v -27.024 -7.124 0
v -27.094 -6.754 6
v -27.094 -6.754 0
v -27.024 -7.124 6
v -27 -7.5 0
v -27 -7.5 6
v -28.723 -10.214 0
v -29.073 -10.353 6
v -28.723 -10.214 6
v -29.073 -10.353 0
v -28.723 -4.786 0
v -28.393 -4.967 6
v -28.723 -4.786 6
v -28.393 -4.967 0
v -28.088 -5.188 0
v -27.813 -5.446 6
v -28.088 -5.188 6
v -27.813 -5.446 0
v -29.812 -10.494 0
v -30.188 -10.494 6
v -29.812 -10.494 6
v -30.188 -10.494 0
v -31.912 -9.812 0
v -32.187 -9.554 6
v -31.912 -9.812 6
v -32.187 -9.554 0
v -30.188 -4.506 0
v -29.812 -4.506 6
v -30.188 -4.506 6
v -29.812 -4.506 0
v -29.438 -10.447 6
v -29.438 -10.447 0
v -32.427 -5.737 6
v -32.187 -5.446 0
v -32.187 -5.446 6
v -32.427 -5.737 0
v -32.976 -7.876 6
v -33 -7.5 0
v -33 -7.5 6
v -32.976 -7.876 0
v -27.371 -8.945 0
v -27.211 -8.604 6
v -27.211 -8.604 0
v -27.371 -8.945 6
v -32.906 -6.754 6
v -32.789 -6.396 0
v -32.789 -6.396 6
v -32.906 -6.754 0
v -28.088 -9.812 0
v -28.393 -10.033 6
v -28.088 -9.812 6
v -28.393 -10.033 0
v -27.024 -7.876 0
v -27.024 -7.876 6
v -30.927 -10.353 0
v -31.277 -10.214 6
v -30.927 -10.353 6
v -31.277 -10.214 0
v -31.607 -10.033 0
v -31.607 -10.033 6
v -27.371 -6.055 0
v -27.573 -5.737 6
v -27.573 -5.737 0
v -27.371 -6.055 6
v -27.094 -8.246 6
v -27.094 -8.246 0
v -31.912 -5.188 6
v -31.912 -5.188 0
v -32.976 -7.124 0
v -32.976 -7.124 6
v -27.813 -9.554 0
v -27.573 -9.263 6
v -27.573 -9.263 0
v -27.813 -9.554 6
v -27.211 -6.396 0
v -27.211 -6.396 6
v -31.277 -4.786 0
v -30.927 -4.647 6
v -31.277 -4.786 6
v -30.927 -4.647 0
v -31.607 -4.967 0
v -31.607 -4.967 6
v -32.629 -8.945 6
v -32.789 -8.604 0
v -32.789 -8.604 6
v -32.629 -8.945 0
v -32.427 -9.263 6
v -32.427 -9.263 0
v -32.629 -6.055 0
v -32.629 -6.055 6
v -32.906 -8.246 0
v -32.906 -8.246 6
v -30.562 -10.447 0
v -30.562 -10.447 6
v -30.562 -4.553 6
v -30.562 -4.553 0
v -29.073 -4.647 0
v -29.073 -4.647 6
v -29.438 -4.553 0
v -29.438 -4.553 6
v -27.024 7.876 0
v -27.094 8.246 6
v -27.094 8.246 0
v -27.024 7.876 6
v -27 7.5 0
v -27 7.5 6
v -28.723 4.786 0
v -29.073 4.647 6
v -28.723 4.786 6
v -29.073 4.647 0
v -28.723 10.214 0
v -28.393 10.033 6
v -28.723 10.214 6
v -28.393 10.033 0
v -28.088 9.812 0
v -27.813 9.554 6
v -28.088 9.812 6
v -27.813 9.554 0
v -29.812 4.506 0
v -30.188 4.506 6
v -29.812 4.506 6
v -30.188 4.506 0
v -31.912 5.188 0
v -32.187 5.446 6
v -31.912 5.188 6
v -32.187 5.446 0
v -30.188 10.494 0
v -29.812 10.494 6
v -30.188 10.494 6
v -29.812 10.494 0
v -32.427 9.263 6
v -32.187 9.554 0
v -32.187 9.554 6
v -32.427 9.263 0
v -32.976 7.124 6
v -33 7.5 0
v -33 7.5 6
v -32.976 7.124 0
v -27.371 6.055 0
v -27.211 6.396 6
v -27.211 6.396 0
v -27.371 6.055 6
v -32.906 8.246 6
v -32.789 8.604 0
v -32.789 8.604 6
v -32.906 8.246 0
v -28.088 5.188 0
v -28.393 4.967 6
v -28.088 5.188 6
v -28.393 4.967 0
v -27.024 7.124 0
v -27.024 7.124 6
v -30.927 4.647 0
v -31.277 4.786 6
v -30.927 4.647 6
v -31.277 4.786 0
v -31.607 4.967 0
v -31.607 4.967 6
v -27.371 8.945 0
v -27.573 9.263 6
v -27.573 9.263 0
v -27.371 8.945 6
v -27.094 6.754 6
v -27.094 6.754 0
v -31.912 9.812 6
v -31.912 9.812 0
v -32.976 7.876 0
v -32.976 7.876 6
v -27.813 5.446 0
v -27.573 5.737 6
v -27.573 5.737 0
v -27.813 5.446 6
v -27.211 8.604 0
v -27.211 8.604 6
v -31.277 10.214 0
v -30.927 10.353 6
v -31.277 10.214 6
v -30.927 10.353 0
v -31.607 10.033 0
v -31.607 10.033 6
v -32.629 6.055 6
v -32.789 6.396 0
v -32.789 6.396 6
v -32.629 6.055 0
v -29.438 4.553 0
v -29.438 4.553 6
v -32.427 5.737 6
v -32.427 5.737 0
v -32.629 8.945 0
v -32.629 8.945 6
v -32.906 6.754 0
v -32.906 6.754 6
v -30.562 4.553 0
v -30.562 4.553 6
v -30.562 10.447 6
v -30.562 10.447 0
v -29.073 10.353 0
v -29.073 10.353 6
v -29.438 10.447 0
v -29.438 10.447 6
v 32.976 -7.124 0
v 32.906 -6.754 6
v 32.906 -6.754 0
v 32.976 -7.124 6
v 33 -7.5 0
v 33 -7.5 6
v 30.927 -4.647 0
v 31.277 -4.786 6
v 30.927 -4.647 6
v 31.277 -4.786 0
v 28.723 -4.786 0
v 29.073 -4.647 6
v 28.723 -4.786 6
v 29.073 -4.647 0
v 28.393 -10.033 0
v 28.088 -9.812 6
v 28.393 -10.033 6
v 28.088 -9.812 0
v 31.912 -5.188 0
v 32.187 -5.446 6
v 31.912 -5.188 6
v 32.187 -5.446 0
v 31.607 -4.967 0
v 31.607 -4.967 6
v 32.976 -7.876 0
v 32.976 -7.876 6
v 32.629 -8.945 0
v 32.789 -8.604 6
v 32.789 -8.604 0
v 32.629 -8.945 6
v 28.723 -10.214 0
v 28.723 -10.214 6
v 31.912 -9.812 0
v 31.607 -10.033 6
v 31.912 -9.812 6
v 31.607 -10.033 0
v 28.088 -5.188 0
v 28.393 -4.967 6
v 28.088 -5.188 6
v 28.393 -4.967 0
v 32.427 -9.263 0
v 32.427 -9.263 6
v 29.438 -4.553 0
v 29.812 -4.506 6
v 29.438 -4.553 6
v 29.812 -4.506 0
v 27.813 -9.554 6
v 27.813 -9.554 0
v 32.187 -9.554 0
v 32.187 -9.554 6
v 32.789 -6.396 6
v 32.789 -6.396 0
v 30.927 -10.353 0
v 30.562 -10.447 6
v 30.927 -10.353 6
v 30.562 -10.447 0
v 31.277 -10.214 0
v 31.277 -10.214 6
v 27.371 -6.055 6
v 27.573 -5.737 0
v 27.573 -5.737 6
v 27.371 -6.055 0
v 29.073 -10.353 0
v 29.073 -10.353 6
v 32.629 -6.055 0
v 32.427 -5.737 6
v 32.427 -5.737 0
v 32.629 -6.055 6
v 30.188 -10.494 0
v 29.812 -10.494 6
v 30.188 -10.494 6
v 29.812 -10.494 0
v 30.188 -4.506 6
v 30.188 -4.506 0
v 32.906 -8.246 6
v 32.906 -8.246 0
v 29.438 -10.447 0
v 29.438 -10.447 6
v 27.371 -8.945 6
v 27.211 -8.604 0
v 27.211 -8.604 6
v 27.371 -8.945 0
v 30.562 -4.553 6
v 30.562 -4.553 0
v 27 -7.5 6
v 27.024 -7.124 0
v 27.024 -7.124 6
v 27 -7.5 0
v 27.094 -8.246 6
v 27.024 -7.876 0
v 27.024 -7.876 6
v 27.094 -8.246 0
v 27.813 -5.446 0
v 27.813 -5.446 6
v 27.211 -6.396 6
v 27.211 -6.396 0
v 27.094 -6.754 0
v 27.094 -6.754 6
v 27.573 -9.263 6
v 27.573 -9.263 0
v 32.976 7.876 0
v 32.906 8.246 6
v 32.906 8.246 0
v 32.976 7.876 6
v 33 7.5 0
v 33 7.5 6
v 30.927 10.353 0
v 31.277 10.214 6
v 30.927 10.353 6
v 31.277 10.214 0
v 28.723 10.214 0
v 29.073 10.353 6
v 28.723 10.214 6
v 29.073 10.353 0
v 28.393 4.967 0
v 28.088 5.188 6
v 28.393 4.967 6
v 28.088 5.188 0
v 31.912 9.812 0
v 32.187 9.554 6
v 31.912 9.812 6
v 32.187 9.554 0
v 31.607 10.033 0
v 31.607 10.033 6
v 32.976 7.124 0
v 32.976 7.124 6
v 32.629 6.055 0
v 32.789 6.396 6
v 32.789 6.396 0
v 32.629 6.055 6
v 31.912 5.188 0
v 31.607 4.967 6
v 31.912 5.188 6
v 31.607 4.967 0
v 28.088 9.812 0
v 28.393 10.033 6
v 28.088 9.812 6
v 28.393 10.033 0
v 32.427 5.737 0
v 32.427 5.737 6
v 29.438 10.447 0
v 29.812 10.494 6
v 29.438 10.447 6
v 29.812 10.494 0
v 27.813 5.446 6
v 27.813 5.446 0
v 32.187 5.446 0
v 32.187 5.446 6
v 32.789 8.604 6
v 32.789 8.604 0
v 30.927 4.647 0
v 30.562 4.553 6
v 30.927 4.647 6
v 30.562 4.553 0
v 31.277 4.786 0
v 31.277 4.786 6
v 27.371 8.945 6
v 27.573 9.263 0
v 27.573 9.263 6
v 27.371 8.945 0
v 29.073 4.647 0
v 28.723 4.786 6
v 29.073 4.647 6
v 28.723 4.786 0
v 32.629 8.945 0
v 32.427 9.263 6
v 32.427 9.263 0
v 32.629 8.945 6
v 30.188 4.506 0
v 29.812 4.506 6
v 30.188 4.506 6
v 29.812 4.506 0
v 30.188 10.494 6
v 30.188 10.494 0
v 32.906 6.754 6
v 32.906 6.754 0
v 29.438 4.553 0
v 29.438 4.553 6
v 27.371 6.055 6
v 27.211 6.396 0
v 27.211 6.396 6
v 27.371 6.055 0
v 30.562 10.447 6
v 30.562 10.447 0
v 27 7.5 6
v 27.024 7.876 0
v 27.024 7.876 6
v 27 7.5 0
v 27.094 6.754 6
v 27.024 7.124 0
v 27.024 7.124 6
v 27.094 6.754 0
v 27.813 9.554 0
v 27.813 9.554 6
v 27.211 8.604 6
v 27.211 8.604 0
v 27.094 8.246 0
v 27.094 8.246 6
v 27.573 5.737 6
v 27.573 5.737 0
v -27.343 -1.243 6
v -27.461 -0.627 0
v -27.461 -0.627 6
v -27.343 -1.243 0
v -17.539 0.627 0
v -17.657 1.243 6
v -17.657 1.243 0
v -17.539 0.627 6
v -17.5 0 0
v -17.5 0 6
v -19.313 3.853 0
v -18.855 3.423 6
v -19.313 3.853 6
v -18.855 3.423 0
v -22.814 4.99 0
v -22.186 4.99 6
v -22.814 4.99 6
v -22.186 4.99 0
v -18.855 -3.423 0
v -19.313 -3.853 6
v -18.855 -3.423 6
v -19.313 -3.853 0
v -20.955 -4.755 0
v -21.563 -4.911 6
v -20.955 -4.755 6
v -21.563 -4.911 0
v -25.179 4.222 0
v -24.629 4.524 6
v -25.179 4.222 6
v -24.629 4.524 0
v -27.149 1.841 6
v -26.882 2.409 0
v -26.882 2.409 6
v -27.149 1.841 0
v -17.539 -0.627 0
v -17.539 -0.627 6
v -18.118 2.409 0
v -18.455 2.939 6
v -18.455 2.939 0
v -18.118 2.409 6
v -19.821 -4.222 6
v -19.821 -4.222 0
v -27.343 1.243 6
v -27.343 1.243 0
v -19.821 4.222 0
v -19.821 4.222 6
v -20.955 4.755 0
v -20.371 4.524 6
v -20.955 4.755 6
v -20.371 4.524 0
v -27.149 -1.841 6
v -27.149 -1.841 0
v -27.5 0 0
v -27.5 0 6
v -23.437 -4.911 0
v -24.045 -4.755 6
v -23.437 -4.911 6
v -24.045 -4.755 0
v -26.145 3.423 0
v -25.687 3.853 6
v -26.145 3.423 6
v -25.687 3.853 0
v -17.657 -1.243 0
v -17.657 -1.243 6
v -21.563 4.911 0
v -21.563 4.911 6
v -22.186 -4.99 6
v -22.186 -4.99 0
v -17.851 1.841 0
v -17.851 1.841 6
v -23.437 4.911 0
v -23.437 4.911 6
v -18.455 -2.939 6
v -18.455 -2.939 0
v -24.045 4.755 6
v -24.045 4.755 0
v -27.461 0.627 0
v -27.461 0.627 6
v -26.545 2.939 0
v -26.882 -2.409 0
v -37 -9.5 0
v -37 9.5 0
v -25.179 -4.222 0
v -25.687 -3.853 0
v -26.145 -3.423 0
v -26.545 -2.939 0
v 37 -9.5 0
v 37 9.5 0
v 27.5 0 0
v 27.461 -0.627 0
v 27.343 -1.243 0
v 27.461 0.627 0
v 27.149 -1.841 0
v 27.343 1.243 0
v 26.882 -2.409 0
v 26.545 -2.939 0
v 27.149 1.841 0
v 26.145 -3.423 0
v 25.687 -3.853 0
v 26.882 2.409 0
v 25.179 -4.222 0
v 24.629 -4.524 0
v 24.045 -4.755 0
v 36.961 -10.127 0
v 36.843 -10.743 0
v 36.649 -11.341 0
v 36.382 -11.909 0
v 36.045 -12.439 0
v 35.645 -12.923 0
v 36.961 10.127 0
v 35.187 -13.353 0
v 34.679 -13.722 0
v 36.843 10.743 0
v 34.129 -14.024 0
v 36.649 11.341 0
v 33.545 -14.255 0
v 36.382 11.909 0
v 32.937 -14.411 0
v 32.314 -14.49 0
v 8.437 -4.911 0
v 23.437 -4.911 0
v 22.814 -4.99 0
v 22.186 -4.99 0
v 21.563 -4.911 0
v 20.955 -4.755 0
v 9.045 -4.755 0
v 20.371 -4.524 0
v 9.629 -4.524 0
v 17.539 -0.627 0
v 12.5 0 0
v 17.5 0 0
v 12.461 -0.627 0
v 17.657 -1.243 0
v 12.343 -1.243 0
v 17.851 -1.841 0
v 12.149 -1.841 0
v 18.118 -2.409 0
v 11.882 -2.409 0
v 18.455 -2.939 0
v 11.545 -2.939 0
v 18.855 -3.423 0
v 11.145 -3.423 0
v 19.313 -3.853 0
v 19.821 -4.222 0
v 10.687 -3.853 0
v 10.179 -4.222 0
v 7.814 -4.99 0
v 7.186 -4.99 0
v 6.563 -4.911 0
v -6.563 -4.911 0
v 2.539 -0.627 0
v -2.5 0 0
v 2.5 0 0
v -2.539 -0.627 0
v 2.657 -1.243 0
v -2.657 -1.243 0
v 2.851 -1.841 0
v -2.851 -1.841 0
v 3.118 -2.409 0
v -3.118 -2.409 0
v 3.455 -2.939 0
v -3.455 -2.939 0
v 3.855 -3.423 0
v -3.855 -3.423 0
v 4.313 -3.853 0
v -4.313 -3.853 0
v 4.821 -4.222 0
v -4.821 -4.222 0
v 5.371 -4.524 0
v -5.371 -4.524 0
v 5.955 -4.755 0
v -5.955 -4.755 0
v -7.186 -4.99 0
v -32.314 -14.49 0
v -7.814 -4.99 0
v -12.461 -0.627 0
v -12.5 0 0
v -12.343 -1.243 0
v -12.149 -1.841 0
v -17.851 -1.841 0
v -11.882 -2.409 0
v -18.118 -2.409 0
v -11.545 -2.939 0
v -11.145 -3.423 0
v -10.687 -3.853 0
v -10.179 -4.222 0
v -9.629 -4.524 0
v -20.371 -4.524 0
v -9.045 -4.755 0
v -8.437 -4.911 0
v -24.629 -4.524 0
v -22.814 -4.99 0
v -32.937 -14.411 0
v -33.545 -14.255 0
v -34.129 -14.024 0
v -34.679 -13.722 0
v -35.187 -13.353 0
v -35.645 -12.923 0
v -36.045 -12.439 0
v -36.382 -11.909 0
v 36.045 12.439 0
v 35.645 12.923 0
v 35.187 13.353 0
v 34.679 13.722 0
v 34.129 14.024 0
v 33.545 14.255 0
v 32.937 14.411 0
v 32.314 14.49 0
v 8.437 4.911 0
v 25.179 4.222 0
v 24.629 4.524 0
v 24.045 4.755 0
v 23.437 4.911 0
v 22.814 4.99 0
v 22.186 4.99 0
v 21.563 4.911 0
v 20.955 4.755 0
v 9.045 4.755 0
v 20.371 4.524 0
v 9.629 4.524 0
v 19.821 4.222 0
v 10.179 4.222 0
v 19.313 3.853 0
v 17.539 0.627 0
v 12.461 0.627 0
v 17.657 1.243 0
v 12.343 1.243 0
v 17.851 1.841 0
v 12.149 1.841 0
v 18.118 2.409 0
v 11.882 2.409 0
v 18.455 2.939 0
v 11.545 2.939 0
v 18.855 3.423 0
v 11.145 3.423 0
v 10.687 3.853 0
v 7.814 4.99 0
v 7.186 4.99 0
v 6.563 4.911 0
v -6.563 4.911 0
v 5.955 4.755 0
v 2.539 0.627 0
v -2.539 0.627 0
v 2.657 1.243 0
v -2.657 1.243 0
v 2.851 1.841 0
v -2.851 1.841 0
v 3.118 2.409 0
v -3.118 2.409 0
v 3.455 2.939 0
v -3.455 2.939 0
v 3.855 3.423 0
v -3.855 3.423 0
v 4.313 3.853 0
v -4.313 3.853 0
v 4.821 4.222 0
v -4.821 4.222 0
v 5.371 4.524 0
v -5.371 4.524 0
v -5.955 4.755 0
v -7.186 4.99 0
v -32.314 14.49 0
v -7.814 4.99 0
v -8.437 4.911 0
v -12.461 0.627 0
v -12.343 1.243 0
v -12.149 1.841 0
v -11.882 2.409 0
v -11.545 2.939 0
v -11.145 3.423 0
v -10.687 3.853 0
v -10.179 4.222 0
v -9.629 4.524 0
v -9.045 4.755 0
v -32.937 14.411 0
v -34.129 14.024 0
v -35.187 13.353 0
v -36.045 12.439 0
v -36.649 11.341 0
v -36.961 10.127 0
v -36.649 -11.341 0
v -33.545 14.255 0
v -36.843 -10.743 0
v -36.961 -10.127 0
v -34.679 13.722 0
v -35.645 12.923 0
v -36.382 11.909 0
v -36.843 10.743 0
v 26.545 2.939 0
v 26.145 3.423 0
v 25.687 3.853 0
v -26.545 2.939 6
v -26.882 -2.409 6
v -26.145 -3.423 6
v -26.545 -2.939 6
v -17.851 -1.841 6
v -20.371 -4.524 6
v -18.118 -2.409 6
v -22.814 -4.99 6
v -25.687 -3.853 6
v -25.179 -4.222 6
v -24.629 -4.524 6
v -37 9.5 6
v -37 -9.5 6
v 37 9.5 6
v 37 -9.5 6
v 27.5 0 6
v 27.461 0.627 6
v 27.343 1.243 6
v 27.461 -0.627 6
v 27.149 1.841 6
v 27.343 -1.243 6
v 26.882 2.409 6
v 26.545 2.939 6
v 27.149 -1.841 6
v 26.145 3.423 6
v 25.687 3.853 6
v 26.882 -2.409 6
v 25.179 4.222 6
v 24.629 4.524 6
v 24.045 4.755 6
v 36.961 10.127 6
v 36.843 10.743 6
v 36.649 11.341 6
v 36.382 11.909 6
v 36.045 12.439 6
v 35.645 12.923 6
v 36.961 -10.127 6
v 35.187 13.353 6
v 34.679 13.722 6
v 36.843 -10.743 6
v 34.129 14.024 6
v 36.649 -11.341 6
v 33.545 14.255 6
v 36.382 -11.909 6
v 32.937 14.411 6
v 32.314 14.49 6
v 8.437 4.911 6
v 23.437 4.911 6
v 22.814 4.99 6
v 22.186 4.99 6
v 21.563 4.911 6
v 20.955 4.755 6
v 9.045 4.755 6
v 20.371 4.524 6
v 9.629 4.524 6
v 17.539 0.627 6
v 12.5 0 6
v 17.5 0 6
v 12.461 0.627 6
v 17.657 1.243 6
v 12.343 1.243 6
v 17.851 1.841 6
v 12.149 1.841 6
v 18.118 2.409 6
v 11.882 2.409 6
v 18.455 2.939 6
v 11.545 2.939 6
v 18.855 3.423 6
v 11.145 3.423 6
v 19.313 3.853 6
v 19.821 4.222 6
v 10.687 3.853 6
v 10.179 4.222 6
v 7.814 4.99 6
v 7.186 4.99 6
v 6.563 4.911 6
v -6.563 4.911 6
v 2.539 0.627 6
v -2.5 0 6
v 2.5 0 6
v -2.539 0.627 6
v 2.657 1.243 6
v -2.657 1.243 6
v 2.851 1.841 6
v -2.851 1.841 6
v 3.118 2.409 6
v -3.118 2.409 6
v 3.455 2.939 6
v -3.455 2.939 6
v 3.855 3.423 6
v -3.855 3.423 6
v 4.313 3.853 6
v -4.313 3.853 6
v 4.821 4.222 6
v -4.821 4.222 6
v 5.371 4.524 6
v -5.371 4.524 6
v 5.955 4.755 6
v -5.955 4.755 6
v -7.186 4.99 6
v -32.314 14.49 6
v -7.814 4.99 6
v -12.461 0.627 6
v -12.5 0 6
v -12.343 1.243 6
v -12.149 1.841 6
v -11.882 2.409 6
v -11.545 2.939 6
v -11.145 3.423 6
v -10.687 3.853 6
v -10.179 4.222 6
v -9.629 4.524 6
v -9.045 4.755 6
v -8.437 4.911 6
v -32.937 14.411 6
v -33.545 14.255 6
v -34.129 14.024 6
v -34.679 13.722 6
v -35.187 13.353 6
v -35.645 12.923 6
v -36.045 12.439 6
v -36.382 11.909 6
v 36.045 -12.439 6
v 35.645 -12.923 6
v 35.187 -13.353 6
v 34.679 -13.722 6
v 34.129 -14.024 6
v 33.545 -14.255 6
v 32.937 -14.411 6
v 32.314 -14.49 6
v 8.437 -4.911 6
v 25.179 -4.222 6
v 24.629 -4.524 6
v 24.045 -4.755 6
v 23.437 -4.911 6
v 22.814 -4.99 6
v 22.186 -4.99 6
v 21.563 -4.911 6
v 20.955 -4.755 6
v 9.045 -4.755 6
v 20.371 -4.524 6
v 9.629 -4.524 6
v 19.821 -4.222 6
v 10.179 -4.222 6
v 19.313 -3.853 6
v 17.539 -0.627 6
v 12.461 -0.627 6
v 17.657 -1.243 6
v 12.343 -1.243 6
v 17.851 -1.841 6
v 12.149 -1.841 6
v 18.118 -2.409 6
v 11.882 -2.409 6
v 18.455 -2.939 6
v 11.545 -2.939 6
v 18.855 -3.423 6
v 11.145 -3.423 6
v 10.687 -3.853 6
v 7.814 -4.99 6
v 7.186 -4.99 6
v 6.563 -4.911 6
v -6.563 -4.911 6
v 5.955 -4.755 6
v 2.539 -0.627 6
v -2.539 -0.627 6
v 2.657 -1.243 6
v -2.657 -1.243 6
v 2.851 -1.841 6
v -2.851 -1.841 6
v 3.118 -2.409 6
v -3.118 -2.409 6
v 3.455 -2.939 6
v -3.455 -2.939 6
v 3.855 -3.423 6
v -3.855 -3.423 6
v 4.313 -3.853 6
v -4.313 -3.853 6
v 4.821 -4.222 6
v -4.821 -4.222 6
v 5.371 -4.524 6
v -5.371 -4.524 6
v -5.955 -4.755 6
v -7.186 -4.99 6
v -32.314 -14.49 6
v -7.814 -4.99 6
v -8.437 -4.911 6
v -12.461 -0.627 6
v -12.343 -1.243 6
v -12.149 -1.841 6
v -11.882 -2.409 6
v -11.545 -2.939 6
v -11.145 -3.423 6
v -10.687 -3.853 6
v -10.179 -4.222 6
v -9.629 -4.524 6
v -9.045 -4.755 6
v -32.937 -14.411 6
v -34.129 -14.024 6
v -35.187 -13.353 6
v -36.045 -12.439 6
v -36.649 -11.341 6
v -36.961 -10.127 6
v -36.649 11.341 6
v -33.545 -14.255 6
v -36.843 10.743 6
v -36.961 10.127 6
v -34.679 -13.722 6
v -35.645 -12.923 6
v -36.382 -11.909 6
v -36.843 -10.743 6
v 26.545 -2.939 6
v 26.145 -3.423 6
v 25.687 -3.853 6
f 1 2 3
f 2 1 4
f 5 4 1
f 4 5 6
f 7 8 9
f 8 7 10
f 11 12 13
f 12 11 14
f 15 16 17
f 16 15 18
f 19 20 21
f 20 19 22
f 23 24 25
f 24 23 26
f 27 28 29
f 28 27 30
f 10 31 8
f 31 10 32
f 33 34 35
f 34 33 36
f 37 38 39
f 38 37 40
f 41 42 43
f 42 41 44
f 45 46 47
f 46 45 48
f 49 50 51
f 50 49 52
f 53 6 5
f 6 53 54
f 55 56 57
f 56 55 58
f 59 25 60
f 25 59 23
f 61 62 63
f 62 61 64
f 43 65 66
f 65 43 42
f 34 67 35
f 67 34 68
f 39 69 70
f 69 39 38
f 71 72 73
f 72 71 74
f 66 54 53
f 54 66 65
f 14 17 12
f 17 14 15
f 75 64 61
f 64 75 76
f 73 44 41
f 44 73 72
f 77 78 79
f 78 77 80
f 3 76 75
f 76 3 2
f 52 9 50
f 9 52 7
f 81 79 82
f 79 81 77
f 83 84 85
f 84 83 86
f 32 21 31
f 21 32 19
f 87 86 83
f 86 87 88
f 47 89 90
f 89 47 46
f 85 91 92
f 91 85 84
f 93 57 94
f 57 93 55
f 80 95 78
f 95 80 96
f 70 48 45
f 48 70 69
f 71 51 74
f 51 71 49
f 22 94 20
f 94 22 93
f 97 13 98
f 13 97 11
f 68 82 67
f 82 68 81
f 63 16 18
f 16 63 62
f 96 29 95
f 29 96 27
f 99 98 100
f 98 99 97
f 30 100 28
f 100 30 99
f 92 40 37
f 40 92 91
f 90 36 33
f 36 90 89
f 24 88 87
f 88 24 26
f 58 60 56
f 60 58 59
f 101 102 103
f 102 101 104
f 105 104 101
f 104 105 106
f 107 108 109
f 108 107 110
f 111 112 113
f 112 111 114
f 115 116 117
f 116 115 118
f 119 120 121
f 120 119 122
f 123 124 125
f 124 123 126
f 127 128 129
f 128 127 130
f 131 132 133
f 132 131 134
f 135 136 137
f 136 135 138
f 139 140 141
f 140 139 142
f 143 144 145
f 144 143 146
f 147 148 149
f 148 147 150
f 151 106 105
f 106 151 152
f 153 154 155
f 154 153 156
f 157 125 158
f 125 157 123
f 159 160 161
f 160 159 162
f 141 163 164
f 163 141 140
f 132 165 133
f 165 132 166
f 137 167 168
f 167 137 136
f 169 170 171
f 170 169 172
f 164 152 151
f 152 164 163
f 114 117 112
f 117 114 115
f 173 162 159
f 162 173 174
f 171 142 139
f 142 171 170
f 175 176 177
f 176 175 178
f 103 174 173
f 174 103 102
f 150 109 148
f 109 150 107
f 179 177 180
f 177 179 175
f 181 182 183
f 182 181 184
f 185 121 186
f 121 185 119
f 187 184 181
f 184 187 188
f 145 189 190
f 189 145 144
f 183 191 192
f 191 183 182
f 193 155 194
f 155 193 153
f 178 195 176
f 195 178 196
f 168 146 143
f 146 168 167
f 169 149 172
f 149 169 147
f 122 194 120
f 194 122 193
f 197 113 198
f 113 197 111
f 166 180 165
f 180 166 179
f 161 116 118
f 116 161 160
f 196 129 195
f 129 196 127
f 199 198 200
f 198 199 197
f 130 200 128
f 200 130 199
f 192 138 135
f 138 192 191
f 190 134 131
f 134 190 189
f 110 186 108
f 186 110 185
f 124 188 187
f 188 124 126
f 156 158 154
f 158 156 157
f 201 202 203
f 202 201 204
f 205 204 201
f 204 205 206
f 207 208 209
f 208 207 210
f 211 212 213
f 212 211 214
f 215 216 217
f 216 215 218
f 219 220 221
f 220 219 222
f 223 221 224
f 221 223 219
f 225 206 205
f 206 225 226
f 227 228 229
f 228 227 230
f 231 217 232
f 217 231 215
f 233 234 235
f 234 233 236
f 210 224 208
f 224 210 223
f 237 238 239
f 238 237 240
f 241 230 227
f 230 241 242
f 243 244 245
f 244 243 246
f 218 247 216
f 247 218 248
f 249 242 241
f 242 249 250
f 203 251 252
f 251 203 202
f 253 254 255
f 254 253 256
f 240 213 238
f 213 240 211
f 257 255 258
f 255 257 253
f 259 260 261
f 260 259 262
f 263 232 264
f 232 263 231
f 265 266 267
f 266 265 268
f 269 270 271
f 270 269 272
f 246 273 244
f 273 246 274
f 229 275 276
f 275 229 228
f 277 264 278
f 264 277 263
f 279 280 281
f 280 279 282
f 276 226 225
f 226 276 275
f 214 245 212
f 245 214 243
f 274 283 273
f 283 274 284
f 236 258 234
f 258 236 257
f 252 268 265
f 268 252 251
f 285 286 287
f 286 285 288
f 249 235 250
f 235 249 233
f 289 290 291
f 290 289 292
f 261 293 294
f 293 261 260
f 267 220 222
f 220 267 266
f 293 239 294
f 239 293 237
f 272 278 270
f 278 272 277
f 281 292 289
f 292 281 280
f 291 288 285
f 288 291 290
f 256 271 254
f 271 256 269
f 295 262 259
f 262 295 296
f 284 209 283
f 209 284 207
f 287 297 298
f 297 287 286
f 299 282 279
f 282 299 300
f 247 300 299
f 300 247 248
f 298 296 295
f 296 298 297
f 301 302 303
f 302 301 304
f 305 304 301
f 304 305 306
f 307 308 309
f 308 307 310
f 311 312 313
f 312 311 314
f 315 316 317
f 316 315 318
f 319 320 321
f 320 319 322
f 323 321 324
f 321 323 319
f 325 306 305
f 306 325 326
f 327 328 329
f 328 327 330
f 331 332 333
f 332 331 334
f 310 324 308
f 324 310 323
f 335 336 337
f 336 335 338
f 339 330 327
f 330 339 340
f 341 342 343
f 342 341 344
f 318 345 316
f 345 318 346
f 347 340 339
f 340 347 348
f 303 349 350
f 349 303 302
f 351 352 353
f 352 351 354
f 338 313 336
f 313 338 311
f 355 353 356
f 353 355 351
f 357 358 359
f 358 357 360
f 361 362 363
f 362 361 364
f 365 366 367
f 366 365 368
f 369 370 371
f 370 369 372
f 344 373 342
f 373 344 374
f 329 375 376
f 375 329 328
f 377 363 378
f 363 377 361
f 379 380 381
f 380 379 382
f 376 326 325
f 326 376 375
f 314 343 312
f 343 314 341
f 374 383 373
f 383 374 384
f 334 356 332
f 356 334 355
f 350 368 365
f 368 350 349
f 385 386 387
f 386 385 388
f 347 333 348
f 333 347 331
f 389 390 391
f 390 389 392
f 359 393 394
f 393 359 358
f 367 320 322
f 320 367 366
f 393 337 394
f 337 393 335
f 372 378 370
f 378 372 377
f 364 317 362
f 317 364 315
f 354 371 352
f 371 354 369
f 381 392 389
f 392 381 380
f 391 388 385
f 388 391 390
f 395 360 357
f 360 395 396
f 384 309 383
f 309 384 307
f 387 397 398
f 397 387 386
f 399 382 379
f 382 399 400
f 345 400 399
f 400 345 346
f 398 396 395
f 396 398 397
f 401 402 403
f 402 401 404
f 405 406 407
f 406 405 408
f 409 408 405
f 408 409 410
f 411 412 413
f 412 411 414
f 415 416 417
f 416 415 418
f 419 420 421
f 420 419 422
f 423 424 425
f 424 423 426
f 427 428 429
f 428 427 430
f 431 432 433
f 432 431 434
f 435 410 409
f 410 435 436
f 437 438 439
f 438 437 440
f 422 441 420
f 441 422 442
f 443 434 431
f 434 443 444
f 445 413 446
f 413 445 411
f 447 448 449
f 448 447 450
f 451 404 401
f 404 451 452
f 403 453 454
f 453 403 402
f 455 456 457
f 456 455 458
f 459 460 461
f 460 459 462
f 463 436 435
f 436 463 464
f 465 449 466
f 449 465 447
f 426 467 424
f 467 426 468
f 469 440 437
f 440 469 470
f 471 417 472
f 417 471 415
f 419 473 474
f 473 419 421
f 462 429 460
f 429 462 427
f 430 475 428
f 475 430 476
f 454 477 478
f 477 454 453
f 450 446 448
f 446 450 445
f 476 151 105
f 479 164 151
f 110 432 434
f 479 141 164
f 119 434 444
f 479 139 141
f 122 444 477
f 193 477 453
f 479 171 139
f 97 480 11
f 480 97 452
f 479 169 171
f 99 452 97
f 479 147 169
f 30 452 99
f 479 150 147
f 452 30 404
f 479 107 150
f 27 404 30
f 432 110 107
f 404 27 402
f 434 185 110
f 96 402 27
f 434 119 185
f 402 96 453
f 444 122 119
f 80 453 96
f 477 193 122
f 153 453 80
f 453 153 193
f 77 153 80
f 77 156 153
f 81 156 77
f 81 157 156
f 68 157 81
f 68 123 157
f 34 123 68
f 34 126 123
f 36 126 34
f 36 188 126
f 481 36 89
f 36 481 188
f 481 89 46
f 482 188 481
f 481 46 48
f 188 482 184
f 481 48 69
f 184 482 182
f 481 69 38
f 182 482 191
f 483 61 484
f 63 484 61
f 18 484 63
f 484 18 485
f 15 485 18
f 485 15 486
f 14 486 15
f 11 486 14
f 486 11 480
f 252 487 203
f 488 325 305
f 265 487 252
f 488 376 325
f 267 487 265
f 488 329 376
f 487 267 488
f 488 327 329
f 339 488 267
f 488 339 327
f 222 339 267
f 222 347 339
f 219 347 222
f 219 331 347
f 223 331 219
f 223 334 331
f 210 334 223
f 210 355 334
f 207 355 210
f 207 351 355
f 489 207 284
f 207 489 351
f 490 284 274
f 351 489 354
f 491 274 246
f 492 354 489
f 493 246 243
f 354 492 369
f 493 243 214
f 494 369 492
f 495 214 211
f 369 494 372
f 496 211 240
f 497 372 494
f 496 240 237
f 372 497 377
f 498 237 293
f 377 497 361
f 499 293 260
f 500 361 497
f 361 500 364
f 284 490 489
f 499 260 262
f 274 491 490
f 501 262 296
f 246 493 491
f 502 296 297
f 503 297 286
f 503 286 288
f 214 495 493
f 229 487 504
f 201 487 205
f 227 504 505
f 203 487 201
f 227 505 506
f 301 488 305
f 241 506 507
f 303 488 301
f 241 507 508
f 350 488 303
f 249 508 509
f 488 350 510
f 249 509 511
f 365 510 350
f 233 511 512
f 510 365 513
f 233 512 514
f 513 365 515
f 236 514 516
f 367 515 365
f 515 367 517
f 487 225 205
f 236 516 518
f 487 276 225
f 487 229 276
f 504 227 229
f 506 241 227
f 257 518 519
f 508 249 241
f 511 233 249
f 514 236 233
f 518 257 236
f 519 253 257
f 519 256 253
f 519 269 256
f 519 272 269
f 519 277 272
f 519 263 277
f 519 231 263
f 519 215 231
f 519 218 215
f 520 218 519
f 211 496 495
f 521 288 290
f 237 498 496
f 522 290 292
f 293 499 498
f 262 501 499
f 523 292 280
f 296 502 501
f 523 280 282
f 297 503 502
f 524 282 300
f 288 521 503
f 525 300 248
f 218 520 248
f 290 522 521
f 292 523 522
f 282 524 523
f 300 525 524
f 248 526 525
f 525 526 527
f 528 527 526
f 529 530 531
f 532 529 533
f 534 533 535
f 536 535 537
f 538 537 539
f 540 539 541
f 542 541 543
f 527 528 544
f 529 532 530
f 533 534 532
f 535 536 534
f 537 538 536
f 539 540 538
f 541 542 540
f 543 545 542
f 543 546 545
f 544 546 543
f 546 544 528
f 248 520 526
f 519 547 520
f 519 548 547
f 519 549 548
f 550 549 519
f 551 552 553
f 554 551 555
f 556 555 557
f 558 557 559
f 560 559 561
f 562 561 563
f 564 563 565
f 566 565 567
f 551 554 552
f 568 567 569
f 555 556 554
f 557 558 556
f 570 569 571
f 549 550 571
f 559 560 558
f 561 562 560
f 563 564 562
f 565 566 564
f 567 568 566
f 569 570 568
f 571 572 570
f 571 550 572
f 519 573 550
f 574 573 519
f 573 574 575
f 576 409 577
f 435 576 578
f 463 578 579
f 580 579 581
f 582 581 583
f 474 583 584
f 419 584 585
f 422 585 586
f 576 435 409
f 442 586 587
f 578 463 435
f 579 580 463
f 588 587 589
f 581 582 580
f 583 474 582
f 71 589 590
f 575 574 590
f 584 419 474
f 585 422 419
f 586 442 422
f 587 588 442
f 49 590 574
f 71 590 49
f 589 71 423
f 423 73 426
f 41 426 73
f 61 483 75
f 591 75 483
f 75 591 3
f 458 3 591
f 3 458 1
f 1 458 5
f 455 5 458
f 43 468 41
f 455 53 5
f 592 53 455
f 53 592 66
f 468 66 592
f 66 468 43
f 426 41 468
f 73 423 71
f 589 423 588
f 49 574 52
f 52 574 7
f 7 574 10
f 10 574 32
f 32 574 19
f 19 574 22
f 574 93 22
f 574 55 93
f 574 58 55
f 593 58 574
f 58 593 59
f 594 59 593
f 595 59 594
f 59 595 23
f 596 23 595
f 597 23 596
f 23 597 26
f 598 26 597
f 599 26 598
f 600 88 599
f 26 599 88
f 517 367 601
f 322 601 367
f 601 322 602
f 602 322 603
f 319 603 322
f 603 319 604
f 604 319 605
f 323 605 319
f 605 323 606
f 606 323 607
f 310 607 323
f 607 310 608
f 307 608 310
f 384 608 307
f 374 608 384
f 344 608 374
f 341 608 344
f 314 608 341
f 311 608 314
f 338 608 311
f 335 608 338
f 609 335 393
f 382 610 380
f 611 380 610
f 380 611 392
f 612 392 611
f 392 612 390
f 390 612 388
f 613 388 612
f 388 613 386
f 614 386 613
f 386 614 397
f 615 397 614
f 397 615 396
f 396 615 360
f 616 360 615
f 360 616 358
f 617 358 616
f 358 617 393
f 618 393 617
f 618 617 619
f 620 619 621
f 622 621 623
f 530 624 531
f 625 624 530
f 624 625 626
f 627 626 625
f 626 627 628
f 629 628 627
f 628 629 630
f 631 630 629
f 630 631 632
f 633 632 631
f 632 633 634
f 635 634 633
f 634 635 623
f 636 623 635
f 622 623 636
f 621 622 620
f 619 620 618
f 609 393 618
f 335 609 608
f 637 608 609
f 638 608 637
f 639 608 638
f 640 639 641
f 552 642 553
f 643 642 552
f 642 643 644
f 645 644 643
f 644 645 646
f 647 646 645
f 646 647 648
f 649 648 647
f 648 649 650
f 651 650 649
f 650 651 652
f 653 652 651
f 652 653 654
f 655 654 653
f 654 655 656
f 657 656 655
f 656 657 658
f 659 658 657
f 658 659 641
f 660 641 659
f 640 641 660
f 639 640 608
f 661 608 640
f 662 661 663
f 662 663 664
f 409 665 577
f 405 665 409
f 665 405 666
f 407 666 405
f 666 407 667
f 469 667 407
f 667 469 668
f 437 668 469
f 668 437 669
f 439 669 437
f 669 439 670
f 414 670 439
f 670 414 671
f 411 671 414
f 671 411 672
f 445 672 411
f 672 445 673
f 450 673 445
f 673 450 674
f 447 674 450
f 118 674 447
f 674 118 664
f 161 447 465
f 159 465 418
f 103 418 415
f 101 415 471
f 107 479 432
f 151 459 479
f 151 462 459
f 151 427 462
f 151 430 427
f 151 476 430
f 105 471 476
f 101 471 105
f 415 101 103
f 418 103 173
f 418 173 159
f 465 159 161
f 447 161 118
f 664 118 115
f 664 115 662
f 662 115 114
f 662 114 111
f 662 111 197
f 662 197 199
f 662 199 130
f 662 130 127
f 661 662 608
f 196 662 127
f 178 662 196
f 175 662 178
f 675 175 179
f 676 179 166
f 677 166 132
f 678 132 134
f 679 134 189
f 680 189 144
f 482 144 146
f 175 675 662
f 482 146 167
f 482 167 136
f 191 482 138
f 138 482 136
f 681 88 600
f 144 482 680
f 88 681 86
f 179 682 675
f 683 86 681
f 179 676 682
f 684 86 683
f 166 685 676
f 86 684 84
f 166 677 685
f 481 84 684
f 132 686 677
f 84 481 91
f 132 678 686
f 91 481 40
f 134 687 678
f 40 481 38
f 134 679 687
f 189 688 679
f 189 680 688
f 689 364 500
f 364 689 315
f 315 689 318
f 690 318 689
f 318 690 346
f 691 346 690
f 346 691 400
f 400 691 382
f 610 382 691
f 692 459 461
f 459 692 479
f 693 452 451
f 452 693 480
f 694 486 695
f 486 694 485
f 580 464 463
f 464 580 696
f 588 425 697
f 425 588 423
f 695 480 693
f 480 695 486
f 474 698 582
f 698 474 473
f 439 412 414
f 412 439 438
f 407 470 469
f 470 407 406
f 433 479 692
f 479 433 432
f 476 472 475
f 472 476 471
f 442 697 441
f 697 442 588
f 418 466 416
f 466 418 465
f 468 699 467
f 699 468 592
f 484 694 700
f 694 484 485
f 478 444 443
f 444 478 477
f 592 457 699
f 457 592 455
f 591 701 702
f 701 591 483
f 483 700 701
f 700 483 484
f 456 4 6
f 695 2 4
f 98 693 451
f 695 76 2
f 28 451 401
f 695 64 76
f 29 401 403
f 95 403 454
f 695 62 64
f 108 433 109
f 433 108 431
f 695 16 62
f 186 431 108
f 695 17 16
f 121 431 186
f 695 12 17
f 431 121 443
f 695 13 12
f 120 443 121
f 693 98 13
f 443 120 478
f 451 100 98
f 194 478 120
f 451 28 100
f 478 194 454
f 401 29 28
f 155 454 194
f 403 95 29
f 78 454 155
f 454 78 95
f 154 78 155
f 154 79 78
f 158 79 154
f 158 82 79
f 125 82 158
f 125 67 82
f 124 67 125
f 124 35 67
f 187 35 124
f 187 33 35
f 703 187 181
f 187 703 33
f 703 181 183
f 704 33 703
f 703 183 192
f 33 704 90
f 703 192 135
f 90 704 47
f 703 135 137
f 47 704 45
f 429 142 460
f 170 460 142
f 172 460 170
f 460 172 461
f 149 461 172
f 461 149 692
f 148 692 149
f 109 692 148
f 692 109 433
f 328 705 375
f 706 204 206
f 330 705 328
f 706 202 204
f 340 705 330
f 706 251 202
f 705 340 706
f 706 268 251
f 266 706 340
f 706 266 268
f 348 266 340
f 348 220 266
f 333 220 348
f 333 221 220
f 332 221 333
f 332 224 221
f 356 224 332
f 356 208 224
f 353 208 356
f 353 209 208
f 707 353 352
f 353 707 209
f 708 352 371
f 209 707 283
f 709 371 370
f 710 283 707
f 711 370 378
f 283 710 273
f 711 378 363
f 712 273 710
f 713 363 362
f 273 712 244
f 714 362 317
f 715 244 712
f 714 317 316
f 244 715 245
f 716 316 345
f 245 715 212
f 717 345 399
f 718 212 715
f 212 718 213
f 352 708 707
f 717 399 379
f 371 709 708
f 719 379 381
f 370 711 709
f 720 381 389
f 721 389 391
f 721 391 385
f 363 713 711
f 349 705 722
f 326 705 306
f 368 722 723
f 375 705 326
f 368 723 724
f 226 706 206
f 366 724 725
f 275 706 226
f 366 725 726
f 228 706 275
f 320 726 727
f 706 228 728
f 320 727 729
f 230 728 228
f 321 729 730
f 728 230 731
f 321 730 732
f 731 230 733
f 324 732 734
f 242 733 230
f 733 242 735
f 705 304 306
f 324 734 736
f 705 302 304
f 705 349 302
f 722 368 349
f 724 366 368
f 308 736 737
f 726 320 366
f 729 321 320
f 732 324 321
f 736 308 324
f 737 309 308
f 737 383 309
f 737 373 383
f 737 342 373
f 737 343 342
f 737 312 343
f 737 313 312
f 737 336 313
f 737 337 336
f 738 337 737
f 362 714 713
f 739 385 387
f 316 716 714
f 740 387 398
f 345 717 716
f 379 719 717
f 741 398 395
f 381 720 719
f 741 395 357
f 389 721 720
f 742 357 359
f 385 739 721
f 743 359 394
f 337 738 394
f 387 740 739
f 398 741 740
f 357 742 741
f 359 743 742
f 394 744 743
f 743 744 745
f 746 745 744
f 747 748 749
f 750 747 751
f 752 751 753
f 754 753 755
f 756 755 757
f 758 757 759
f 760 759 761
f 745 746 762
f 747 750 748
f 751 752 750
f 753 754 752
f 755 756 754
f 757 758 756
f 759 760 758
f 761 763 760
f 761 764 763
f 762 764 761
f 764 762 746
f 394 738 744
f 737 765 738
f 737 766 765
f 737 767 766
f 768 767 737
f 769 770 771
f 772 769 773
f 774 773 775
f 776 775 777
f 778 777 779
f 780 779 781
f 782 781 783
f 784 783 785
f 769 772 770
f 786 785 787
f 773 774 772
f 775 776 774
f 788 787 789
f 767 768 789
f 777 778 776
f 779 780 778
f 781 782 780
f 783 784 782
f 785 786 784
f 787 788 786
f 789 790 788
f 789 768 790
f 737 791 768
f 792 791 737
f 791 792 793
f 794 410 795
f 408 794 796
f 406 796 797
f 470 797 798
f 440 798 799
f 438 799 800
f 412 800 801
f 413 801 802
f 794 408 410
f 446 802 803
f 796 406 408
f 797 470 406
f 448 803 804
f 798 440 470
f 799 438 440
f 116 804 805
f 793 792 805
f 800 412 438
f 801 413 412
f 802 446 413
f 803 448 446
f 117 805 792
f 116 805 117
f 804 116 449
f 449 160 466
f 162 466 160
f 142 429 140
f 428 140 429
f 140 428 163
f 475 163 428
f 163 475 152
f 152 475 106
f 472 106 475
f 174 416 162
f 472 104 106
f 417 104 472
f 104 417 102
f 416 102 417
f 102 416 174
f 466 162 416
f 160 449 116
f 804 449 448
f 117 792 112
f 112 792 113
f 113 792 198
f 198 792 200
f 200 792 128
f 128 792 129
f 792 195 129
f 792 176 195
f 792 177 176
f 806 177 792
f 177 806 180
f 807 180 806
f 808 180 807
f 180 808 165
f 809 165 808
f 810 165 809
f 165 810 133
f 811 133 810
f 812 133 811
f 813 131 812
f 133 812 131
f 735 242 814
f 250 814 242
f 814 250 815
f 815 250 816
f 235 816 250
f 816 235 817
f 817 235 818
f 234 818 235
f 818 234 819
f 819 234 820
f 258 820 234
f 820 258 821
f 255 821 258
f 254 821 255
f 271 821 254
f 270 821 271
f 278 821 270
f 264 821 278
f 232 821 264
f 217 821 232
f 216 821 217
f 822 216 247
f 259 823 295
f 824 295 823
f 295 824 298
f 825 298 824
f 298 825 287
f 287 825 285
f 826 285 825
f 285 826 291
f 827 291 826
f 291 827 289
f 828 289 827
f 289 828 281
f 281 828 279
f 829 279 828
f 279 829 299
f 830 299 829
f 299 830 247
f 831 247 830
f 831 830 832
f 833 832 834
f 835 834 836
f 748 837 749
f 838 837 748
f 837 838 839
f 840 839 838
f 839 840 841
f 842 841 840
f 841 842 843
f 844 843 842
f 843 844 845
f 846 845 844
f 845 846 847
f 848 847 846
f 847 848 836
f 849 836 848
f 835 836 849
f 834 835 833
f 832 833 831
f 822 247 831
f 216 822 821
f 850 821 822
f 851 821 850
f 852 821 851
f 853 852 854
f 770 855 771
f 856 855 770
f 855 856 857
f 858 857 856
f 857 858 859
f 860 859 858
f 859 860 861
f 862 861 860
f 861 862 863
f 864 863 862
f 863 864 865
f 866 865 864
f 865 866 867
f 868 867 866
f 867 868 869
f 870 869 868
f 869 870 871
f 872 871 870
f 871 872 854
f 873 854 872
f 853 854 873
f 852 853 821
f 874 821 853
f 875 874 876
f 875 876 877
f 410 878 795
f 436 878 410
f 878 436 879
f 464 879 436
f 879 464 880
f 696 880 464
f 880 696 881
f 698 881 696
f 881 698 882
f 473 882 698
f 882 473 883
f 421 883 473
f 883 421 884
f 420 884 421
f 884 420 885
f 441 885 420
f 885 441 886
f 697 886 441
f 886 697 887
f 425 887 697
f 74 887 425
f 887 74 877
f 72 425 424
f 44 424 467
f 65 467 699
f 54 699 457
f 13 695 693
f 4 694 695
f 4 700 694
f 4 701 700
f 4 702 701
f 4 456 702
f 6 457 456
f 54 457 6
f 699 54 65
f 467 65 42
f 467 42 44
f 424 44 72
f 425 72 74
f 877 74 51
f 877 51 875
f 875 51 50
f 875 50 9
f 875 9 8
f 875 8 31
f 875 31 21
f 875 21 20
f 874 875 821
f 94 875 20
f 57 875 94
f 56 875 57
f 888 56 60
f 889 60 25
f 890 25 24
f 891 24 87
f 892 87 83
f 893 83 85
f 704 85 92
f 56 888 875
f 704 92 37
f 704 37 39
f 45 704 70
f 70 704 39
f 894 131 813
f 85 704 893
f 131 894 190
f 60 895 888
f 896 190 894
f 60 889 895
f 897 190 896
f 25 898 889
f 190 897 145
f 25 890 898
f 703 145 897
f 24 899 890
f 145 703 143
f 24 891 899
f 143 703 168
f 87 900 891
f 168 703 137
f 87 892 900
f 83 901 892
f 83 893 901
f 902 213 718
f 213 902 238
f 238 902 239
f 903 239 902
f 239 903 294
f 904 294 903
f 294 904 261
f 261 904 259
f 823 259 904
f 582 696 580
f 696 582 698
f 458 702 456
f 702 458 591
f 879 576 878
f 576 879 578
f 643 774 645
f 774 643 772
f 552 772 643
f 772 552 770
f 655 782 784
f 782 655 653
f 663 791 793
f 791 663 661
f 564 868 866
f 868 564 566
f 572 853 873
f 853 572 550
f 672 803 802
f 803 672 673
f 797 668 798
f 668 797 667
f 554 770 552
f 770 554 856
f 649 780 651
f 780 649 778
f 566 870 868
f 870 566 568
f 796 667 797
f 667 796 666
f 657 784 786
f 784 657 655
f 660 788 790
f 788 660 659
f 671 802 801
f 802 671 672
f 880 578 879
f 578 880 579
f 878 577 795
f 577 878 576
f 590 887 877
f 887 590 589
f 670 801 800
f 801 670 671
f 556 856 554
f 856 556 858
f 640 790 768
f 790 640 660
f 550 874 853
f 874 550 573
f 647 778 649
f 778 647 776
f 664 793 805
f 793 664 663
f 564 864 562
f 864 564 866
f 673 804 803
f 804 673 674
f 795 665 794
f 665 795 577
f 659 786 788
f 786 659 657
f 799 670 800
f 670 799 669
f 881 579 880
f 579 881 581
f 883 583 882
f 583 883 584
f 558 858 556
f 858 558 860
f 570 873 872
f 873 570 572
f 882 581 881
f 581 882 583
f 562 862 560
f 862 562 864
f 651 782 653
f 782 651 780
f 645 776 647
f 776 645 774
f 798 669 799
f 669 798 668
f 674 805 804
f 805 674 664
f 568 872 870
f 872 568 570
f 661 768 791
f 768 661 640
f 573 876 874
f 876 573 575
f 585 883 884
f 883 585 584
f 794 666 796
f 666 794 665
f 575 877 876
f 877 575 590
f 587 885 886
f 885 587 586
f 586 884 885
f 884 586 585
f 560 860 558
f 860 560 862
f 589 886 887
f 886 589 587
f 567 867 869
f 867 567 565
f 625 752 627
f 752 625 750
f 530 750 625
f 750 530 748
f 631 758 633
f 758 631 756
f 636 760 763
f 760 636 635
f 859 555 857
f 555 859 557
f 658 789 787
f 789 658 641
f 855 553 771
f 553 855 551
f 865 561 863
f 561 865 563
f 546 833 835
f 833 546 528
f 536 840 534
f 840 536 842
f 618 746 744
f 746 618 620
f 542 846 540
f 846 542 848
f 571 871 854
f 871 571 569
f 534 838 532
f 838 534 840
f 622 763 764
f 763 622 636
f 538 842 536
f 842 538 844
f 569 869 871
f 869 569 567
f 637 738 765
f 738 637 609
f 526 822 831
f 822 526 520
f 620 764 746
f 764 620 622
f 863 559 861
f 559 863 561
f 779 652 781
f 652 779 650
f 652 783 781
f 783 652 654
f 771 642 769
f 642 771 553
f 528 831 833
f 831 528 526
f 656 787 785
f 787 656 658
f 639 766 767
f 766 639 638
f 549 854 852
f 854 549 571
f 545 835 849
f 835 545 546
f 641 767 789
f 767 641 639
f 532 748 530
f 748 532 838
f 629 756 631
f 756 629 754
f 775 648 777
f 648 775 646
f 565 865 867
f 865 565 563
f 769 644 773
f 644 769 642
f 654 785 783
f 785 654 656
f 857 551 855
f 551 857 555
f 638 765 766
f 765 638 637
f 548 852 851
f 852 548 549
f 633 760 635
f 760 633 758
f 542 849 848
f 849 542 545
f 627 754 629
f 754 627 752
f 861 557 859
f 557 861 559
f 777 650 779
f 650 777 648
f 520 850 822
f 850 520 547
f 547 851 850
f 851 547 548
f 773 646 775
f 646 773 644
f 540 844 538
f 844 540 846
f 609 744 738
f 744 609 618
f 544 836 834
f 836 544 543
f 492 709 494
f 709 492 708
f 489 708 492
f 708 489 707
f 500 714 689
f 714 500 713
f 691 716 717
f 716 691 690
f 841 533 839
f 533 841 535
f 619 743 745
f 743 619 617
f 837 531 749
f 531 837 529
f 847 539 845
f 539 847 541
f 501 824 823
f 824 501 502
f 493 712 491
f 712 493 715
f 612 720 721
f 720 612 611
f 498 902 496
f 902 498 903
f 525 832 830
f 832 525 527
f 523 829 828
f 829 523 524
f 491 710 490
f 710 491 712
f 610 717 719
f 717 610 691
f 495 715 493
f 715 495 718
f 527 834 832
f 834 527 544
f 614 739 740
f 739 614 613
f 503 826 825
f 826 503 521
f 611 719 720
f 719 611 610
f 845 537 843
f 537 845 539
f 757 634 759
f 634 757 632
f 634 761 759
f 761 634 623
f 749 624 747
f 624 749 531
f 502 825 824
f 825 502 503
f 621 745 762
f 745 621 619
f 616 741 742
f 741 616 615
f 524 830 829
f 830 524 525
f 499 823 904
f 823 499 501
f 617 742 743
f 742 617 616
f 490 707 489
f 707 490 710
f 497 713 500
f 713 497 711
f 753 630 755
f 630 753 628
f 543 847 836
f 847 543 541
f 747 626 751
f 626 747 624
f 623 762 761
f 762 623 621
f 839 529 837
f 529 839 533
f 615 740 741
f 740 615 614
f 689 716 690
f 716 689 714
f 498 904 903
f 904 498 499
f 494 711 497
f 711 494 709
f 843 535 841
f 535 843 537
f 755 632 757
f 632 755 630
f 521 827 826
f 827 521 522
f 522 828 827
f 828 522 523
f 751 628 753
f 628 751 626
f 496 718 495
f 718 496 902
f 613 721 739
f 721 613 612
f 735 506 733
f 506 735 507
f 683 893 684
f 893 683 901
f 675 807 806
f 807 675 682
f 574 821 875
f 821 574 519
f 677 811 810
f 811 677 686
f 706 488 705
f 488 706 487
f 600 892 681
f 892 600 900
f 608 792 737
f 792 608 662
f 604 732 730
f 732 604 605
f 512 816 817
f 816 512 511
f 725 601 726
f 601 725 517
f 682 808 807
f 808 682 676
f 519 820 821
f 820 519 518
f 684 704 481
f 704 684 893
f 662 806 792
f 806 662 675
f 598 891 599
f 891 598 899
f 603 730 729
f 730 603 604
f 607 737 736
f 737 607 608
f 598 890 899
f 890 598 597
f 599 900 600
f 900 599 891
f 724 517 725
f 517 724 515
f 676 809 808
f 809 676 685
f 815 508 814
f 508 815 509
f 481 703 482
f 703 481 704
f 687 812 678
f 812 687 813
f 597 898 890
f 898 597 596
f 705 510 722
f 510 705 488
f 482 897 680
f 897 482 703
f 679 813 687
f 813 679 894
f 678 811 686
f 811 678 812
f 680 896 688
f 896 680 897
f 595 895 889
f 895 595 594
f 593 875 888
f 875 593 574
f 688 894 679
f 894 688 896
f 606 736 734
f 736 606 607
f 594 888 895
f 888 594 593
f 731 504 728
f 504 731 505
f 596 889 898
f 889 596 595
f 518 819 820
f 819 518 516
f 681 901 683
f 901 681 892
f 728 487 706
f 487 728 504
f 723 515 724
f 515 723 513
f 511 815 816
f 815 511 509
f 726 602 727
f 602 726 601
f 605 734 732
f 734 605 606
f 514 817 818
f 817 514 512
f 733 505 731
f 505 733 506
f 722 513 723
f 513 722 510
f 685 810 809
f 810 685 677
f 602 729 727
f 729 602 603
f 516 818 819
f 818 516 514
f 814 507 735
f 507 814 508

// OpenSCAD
$fn = 50;


difference() {
	union() {
		hull() {
			translate(v = [-32.0000000000, 9.5000000000, 0]) {
				cylinder(h = 6, r = 5);
			}
			translate(v = [32.0000000000, 9.5000000000, 0]) {
				cylinder(h = 6, r = 5);
			}
			translate(v = [-32.0000000000, -9.5000000000, 0]) {
				cylinder(h = 6, r = 5);
			}
			translate(v = [32.0000000000, -9.5000000000, 0]) {
				cylinder(h = 6, r = 5);
			}
		}
	}
	union() {
		#translate(v = [-30.0000000000, -7.5000000000, -100.0000000000]) {
			cylinder(h = 200, r = 3.0000000000);
		}
		#translate(v = [-30.0000000000, 7.5000000000, -100.0000000000]) {
			cylinder(h = 200, r = 3.0000000000);
		}
		#translate(v = [30.0000000000, -7.5000000000, -100.0000000000]) {
			cylinder(h = 200, r = 3.0000000000);
		}
		#translate(v = [30.0000000000, 7.5000000000, -100.0000000000]) {
			cylinder(h = 200, r = 3.0000000000);
		}
		#translate(v = [-22.5000000000, 0, 0]) {
			cylinder(h = 6, r = 5.0000000000);
		}
		#translate(v = [-7.5000000000, 0, 0]) {
			cylinder(h = 6, r = 5.0000000000);
		}
		#translate(v = [7.5000000000, 0, 0]) {
			cylinder(h = 6, r = 5.0000000000);
		}
		#translate(v = [22.5000000000, 0, 0]) {
			cylinder(h = 6, r = 5.0000000000);
		}
	}
}
